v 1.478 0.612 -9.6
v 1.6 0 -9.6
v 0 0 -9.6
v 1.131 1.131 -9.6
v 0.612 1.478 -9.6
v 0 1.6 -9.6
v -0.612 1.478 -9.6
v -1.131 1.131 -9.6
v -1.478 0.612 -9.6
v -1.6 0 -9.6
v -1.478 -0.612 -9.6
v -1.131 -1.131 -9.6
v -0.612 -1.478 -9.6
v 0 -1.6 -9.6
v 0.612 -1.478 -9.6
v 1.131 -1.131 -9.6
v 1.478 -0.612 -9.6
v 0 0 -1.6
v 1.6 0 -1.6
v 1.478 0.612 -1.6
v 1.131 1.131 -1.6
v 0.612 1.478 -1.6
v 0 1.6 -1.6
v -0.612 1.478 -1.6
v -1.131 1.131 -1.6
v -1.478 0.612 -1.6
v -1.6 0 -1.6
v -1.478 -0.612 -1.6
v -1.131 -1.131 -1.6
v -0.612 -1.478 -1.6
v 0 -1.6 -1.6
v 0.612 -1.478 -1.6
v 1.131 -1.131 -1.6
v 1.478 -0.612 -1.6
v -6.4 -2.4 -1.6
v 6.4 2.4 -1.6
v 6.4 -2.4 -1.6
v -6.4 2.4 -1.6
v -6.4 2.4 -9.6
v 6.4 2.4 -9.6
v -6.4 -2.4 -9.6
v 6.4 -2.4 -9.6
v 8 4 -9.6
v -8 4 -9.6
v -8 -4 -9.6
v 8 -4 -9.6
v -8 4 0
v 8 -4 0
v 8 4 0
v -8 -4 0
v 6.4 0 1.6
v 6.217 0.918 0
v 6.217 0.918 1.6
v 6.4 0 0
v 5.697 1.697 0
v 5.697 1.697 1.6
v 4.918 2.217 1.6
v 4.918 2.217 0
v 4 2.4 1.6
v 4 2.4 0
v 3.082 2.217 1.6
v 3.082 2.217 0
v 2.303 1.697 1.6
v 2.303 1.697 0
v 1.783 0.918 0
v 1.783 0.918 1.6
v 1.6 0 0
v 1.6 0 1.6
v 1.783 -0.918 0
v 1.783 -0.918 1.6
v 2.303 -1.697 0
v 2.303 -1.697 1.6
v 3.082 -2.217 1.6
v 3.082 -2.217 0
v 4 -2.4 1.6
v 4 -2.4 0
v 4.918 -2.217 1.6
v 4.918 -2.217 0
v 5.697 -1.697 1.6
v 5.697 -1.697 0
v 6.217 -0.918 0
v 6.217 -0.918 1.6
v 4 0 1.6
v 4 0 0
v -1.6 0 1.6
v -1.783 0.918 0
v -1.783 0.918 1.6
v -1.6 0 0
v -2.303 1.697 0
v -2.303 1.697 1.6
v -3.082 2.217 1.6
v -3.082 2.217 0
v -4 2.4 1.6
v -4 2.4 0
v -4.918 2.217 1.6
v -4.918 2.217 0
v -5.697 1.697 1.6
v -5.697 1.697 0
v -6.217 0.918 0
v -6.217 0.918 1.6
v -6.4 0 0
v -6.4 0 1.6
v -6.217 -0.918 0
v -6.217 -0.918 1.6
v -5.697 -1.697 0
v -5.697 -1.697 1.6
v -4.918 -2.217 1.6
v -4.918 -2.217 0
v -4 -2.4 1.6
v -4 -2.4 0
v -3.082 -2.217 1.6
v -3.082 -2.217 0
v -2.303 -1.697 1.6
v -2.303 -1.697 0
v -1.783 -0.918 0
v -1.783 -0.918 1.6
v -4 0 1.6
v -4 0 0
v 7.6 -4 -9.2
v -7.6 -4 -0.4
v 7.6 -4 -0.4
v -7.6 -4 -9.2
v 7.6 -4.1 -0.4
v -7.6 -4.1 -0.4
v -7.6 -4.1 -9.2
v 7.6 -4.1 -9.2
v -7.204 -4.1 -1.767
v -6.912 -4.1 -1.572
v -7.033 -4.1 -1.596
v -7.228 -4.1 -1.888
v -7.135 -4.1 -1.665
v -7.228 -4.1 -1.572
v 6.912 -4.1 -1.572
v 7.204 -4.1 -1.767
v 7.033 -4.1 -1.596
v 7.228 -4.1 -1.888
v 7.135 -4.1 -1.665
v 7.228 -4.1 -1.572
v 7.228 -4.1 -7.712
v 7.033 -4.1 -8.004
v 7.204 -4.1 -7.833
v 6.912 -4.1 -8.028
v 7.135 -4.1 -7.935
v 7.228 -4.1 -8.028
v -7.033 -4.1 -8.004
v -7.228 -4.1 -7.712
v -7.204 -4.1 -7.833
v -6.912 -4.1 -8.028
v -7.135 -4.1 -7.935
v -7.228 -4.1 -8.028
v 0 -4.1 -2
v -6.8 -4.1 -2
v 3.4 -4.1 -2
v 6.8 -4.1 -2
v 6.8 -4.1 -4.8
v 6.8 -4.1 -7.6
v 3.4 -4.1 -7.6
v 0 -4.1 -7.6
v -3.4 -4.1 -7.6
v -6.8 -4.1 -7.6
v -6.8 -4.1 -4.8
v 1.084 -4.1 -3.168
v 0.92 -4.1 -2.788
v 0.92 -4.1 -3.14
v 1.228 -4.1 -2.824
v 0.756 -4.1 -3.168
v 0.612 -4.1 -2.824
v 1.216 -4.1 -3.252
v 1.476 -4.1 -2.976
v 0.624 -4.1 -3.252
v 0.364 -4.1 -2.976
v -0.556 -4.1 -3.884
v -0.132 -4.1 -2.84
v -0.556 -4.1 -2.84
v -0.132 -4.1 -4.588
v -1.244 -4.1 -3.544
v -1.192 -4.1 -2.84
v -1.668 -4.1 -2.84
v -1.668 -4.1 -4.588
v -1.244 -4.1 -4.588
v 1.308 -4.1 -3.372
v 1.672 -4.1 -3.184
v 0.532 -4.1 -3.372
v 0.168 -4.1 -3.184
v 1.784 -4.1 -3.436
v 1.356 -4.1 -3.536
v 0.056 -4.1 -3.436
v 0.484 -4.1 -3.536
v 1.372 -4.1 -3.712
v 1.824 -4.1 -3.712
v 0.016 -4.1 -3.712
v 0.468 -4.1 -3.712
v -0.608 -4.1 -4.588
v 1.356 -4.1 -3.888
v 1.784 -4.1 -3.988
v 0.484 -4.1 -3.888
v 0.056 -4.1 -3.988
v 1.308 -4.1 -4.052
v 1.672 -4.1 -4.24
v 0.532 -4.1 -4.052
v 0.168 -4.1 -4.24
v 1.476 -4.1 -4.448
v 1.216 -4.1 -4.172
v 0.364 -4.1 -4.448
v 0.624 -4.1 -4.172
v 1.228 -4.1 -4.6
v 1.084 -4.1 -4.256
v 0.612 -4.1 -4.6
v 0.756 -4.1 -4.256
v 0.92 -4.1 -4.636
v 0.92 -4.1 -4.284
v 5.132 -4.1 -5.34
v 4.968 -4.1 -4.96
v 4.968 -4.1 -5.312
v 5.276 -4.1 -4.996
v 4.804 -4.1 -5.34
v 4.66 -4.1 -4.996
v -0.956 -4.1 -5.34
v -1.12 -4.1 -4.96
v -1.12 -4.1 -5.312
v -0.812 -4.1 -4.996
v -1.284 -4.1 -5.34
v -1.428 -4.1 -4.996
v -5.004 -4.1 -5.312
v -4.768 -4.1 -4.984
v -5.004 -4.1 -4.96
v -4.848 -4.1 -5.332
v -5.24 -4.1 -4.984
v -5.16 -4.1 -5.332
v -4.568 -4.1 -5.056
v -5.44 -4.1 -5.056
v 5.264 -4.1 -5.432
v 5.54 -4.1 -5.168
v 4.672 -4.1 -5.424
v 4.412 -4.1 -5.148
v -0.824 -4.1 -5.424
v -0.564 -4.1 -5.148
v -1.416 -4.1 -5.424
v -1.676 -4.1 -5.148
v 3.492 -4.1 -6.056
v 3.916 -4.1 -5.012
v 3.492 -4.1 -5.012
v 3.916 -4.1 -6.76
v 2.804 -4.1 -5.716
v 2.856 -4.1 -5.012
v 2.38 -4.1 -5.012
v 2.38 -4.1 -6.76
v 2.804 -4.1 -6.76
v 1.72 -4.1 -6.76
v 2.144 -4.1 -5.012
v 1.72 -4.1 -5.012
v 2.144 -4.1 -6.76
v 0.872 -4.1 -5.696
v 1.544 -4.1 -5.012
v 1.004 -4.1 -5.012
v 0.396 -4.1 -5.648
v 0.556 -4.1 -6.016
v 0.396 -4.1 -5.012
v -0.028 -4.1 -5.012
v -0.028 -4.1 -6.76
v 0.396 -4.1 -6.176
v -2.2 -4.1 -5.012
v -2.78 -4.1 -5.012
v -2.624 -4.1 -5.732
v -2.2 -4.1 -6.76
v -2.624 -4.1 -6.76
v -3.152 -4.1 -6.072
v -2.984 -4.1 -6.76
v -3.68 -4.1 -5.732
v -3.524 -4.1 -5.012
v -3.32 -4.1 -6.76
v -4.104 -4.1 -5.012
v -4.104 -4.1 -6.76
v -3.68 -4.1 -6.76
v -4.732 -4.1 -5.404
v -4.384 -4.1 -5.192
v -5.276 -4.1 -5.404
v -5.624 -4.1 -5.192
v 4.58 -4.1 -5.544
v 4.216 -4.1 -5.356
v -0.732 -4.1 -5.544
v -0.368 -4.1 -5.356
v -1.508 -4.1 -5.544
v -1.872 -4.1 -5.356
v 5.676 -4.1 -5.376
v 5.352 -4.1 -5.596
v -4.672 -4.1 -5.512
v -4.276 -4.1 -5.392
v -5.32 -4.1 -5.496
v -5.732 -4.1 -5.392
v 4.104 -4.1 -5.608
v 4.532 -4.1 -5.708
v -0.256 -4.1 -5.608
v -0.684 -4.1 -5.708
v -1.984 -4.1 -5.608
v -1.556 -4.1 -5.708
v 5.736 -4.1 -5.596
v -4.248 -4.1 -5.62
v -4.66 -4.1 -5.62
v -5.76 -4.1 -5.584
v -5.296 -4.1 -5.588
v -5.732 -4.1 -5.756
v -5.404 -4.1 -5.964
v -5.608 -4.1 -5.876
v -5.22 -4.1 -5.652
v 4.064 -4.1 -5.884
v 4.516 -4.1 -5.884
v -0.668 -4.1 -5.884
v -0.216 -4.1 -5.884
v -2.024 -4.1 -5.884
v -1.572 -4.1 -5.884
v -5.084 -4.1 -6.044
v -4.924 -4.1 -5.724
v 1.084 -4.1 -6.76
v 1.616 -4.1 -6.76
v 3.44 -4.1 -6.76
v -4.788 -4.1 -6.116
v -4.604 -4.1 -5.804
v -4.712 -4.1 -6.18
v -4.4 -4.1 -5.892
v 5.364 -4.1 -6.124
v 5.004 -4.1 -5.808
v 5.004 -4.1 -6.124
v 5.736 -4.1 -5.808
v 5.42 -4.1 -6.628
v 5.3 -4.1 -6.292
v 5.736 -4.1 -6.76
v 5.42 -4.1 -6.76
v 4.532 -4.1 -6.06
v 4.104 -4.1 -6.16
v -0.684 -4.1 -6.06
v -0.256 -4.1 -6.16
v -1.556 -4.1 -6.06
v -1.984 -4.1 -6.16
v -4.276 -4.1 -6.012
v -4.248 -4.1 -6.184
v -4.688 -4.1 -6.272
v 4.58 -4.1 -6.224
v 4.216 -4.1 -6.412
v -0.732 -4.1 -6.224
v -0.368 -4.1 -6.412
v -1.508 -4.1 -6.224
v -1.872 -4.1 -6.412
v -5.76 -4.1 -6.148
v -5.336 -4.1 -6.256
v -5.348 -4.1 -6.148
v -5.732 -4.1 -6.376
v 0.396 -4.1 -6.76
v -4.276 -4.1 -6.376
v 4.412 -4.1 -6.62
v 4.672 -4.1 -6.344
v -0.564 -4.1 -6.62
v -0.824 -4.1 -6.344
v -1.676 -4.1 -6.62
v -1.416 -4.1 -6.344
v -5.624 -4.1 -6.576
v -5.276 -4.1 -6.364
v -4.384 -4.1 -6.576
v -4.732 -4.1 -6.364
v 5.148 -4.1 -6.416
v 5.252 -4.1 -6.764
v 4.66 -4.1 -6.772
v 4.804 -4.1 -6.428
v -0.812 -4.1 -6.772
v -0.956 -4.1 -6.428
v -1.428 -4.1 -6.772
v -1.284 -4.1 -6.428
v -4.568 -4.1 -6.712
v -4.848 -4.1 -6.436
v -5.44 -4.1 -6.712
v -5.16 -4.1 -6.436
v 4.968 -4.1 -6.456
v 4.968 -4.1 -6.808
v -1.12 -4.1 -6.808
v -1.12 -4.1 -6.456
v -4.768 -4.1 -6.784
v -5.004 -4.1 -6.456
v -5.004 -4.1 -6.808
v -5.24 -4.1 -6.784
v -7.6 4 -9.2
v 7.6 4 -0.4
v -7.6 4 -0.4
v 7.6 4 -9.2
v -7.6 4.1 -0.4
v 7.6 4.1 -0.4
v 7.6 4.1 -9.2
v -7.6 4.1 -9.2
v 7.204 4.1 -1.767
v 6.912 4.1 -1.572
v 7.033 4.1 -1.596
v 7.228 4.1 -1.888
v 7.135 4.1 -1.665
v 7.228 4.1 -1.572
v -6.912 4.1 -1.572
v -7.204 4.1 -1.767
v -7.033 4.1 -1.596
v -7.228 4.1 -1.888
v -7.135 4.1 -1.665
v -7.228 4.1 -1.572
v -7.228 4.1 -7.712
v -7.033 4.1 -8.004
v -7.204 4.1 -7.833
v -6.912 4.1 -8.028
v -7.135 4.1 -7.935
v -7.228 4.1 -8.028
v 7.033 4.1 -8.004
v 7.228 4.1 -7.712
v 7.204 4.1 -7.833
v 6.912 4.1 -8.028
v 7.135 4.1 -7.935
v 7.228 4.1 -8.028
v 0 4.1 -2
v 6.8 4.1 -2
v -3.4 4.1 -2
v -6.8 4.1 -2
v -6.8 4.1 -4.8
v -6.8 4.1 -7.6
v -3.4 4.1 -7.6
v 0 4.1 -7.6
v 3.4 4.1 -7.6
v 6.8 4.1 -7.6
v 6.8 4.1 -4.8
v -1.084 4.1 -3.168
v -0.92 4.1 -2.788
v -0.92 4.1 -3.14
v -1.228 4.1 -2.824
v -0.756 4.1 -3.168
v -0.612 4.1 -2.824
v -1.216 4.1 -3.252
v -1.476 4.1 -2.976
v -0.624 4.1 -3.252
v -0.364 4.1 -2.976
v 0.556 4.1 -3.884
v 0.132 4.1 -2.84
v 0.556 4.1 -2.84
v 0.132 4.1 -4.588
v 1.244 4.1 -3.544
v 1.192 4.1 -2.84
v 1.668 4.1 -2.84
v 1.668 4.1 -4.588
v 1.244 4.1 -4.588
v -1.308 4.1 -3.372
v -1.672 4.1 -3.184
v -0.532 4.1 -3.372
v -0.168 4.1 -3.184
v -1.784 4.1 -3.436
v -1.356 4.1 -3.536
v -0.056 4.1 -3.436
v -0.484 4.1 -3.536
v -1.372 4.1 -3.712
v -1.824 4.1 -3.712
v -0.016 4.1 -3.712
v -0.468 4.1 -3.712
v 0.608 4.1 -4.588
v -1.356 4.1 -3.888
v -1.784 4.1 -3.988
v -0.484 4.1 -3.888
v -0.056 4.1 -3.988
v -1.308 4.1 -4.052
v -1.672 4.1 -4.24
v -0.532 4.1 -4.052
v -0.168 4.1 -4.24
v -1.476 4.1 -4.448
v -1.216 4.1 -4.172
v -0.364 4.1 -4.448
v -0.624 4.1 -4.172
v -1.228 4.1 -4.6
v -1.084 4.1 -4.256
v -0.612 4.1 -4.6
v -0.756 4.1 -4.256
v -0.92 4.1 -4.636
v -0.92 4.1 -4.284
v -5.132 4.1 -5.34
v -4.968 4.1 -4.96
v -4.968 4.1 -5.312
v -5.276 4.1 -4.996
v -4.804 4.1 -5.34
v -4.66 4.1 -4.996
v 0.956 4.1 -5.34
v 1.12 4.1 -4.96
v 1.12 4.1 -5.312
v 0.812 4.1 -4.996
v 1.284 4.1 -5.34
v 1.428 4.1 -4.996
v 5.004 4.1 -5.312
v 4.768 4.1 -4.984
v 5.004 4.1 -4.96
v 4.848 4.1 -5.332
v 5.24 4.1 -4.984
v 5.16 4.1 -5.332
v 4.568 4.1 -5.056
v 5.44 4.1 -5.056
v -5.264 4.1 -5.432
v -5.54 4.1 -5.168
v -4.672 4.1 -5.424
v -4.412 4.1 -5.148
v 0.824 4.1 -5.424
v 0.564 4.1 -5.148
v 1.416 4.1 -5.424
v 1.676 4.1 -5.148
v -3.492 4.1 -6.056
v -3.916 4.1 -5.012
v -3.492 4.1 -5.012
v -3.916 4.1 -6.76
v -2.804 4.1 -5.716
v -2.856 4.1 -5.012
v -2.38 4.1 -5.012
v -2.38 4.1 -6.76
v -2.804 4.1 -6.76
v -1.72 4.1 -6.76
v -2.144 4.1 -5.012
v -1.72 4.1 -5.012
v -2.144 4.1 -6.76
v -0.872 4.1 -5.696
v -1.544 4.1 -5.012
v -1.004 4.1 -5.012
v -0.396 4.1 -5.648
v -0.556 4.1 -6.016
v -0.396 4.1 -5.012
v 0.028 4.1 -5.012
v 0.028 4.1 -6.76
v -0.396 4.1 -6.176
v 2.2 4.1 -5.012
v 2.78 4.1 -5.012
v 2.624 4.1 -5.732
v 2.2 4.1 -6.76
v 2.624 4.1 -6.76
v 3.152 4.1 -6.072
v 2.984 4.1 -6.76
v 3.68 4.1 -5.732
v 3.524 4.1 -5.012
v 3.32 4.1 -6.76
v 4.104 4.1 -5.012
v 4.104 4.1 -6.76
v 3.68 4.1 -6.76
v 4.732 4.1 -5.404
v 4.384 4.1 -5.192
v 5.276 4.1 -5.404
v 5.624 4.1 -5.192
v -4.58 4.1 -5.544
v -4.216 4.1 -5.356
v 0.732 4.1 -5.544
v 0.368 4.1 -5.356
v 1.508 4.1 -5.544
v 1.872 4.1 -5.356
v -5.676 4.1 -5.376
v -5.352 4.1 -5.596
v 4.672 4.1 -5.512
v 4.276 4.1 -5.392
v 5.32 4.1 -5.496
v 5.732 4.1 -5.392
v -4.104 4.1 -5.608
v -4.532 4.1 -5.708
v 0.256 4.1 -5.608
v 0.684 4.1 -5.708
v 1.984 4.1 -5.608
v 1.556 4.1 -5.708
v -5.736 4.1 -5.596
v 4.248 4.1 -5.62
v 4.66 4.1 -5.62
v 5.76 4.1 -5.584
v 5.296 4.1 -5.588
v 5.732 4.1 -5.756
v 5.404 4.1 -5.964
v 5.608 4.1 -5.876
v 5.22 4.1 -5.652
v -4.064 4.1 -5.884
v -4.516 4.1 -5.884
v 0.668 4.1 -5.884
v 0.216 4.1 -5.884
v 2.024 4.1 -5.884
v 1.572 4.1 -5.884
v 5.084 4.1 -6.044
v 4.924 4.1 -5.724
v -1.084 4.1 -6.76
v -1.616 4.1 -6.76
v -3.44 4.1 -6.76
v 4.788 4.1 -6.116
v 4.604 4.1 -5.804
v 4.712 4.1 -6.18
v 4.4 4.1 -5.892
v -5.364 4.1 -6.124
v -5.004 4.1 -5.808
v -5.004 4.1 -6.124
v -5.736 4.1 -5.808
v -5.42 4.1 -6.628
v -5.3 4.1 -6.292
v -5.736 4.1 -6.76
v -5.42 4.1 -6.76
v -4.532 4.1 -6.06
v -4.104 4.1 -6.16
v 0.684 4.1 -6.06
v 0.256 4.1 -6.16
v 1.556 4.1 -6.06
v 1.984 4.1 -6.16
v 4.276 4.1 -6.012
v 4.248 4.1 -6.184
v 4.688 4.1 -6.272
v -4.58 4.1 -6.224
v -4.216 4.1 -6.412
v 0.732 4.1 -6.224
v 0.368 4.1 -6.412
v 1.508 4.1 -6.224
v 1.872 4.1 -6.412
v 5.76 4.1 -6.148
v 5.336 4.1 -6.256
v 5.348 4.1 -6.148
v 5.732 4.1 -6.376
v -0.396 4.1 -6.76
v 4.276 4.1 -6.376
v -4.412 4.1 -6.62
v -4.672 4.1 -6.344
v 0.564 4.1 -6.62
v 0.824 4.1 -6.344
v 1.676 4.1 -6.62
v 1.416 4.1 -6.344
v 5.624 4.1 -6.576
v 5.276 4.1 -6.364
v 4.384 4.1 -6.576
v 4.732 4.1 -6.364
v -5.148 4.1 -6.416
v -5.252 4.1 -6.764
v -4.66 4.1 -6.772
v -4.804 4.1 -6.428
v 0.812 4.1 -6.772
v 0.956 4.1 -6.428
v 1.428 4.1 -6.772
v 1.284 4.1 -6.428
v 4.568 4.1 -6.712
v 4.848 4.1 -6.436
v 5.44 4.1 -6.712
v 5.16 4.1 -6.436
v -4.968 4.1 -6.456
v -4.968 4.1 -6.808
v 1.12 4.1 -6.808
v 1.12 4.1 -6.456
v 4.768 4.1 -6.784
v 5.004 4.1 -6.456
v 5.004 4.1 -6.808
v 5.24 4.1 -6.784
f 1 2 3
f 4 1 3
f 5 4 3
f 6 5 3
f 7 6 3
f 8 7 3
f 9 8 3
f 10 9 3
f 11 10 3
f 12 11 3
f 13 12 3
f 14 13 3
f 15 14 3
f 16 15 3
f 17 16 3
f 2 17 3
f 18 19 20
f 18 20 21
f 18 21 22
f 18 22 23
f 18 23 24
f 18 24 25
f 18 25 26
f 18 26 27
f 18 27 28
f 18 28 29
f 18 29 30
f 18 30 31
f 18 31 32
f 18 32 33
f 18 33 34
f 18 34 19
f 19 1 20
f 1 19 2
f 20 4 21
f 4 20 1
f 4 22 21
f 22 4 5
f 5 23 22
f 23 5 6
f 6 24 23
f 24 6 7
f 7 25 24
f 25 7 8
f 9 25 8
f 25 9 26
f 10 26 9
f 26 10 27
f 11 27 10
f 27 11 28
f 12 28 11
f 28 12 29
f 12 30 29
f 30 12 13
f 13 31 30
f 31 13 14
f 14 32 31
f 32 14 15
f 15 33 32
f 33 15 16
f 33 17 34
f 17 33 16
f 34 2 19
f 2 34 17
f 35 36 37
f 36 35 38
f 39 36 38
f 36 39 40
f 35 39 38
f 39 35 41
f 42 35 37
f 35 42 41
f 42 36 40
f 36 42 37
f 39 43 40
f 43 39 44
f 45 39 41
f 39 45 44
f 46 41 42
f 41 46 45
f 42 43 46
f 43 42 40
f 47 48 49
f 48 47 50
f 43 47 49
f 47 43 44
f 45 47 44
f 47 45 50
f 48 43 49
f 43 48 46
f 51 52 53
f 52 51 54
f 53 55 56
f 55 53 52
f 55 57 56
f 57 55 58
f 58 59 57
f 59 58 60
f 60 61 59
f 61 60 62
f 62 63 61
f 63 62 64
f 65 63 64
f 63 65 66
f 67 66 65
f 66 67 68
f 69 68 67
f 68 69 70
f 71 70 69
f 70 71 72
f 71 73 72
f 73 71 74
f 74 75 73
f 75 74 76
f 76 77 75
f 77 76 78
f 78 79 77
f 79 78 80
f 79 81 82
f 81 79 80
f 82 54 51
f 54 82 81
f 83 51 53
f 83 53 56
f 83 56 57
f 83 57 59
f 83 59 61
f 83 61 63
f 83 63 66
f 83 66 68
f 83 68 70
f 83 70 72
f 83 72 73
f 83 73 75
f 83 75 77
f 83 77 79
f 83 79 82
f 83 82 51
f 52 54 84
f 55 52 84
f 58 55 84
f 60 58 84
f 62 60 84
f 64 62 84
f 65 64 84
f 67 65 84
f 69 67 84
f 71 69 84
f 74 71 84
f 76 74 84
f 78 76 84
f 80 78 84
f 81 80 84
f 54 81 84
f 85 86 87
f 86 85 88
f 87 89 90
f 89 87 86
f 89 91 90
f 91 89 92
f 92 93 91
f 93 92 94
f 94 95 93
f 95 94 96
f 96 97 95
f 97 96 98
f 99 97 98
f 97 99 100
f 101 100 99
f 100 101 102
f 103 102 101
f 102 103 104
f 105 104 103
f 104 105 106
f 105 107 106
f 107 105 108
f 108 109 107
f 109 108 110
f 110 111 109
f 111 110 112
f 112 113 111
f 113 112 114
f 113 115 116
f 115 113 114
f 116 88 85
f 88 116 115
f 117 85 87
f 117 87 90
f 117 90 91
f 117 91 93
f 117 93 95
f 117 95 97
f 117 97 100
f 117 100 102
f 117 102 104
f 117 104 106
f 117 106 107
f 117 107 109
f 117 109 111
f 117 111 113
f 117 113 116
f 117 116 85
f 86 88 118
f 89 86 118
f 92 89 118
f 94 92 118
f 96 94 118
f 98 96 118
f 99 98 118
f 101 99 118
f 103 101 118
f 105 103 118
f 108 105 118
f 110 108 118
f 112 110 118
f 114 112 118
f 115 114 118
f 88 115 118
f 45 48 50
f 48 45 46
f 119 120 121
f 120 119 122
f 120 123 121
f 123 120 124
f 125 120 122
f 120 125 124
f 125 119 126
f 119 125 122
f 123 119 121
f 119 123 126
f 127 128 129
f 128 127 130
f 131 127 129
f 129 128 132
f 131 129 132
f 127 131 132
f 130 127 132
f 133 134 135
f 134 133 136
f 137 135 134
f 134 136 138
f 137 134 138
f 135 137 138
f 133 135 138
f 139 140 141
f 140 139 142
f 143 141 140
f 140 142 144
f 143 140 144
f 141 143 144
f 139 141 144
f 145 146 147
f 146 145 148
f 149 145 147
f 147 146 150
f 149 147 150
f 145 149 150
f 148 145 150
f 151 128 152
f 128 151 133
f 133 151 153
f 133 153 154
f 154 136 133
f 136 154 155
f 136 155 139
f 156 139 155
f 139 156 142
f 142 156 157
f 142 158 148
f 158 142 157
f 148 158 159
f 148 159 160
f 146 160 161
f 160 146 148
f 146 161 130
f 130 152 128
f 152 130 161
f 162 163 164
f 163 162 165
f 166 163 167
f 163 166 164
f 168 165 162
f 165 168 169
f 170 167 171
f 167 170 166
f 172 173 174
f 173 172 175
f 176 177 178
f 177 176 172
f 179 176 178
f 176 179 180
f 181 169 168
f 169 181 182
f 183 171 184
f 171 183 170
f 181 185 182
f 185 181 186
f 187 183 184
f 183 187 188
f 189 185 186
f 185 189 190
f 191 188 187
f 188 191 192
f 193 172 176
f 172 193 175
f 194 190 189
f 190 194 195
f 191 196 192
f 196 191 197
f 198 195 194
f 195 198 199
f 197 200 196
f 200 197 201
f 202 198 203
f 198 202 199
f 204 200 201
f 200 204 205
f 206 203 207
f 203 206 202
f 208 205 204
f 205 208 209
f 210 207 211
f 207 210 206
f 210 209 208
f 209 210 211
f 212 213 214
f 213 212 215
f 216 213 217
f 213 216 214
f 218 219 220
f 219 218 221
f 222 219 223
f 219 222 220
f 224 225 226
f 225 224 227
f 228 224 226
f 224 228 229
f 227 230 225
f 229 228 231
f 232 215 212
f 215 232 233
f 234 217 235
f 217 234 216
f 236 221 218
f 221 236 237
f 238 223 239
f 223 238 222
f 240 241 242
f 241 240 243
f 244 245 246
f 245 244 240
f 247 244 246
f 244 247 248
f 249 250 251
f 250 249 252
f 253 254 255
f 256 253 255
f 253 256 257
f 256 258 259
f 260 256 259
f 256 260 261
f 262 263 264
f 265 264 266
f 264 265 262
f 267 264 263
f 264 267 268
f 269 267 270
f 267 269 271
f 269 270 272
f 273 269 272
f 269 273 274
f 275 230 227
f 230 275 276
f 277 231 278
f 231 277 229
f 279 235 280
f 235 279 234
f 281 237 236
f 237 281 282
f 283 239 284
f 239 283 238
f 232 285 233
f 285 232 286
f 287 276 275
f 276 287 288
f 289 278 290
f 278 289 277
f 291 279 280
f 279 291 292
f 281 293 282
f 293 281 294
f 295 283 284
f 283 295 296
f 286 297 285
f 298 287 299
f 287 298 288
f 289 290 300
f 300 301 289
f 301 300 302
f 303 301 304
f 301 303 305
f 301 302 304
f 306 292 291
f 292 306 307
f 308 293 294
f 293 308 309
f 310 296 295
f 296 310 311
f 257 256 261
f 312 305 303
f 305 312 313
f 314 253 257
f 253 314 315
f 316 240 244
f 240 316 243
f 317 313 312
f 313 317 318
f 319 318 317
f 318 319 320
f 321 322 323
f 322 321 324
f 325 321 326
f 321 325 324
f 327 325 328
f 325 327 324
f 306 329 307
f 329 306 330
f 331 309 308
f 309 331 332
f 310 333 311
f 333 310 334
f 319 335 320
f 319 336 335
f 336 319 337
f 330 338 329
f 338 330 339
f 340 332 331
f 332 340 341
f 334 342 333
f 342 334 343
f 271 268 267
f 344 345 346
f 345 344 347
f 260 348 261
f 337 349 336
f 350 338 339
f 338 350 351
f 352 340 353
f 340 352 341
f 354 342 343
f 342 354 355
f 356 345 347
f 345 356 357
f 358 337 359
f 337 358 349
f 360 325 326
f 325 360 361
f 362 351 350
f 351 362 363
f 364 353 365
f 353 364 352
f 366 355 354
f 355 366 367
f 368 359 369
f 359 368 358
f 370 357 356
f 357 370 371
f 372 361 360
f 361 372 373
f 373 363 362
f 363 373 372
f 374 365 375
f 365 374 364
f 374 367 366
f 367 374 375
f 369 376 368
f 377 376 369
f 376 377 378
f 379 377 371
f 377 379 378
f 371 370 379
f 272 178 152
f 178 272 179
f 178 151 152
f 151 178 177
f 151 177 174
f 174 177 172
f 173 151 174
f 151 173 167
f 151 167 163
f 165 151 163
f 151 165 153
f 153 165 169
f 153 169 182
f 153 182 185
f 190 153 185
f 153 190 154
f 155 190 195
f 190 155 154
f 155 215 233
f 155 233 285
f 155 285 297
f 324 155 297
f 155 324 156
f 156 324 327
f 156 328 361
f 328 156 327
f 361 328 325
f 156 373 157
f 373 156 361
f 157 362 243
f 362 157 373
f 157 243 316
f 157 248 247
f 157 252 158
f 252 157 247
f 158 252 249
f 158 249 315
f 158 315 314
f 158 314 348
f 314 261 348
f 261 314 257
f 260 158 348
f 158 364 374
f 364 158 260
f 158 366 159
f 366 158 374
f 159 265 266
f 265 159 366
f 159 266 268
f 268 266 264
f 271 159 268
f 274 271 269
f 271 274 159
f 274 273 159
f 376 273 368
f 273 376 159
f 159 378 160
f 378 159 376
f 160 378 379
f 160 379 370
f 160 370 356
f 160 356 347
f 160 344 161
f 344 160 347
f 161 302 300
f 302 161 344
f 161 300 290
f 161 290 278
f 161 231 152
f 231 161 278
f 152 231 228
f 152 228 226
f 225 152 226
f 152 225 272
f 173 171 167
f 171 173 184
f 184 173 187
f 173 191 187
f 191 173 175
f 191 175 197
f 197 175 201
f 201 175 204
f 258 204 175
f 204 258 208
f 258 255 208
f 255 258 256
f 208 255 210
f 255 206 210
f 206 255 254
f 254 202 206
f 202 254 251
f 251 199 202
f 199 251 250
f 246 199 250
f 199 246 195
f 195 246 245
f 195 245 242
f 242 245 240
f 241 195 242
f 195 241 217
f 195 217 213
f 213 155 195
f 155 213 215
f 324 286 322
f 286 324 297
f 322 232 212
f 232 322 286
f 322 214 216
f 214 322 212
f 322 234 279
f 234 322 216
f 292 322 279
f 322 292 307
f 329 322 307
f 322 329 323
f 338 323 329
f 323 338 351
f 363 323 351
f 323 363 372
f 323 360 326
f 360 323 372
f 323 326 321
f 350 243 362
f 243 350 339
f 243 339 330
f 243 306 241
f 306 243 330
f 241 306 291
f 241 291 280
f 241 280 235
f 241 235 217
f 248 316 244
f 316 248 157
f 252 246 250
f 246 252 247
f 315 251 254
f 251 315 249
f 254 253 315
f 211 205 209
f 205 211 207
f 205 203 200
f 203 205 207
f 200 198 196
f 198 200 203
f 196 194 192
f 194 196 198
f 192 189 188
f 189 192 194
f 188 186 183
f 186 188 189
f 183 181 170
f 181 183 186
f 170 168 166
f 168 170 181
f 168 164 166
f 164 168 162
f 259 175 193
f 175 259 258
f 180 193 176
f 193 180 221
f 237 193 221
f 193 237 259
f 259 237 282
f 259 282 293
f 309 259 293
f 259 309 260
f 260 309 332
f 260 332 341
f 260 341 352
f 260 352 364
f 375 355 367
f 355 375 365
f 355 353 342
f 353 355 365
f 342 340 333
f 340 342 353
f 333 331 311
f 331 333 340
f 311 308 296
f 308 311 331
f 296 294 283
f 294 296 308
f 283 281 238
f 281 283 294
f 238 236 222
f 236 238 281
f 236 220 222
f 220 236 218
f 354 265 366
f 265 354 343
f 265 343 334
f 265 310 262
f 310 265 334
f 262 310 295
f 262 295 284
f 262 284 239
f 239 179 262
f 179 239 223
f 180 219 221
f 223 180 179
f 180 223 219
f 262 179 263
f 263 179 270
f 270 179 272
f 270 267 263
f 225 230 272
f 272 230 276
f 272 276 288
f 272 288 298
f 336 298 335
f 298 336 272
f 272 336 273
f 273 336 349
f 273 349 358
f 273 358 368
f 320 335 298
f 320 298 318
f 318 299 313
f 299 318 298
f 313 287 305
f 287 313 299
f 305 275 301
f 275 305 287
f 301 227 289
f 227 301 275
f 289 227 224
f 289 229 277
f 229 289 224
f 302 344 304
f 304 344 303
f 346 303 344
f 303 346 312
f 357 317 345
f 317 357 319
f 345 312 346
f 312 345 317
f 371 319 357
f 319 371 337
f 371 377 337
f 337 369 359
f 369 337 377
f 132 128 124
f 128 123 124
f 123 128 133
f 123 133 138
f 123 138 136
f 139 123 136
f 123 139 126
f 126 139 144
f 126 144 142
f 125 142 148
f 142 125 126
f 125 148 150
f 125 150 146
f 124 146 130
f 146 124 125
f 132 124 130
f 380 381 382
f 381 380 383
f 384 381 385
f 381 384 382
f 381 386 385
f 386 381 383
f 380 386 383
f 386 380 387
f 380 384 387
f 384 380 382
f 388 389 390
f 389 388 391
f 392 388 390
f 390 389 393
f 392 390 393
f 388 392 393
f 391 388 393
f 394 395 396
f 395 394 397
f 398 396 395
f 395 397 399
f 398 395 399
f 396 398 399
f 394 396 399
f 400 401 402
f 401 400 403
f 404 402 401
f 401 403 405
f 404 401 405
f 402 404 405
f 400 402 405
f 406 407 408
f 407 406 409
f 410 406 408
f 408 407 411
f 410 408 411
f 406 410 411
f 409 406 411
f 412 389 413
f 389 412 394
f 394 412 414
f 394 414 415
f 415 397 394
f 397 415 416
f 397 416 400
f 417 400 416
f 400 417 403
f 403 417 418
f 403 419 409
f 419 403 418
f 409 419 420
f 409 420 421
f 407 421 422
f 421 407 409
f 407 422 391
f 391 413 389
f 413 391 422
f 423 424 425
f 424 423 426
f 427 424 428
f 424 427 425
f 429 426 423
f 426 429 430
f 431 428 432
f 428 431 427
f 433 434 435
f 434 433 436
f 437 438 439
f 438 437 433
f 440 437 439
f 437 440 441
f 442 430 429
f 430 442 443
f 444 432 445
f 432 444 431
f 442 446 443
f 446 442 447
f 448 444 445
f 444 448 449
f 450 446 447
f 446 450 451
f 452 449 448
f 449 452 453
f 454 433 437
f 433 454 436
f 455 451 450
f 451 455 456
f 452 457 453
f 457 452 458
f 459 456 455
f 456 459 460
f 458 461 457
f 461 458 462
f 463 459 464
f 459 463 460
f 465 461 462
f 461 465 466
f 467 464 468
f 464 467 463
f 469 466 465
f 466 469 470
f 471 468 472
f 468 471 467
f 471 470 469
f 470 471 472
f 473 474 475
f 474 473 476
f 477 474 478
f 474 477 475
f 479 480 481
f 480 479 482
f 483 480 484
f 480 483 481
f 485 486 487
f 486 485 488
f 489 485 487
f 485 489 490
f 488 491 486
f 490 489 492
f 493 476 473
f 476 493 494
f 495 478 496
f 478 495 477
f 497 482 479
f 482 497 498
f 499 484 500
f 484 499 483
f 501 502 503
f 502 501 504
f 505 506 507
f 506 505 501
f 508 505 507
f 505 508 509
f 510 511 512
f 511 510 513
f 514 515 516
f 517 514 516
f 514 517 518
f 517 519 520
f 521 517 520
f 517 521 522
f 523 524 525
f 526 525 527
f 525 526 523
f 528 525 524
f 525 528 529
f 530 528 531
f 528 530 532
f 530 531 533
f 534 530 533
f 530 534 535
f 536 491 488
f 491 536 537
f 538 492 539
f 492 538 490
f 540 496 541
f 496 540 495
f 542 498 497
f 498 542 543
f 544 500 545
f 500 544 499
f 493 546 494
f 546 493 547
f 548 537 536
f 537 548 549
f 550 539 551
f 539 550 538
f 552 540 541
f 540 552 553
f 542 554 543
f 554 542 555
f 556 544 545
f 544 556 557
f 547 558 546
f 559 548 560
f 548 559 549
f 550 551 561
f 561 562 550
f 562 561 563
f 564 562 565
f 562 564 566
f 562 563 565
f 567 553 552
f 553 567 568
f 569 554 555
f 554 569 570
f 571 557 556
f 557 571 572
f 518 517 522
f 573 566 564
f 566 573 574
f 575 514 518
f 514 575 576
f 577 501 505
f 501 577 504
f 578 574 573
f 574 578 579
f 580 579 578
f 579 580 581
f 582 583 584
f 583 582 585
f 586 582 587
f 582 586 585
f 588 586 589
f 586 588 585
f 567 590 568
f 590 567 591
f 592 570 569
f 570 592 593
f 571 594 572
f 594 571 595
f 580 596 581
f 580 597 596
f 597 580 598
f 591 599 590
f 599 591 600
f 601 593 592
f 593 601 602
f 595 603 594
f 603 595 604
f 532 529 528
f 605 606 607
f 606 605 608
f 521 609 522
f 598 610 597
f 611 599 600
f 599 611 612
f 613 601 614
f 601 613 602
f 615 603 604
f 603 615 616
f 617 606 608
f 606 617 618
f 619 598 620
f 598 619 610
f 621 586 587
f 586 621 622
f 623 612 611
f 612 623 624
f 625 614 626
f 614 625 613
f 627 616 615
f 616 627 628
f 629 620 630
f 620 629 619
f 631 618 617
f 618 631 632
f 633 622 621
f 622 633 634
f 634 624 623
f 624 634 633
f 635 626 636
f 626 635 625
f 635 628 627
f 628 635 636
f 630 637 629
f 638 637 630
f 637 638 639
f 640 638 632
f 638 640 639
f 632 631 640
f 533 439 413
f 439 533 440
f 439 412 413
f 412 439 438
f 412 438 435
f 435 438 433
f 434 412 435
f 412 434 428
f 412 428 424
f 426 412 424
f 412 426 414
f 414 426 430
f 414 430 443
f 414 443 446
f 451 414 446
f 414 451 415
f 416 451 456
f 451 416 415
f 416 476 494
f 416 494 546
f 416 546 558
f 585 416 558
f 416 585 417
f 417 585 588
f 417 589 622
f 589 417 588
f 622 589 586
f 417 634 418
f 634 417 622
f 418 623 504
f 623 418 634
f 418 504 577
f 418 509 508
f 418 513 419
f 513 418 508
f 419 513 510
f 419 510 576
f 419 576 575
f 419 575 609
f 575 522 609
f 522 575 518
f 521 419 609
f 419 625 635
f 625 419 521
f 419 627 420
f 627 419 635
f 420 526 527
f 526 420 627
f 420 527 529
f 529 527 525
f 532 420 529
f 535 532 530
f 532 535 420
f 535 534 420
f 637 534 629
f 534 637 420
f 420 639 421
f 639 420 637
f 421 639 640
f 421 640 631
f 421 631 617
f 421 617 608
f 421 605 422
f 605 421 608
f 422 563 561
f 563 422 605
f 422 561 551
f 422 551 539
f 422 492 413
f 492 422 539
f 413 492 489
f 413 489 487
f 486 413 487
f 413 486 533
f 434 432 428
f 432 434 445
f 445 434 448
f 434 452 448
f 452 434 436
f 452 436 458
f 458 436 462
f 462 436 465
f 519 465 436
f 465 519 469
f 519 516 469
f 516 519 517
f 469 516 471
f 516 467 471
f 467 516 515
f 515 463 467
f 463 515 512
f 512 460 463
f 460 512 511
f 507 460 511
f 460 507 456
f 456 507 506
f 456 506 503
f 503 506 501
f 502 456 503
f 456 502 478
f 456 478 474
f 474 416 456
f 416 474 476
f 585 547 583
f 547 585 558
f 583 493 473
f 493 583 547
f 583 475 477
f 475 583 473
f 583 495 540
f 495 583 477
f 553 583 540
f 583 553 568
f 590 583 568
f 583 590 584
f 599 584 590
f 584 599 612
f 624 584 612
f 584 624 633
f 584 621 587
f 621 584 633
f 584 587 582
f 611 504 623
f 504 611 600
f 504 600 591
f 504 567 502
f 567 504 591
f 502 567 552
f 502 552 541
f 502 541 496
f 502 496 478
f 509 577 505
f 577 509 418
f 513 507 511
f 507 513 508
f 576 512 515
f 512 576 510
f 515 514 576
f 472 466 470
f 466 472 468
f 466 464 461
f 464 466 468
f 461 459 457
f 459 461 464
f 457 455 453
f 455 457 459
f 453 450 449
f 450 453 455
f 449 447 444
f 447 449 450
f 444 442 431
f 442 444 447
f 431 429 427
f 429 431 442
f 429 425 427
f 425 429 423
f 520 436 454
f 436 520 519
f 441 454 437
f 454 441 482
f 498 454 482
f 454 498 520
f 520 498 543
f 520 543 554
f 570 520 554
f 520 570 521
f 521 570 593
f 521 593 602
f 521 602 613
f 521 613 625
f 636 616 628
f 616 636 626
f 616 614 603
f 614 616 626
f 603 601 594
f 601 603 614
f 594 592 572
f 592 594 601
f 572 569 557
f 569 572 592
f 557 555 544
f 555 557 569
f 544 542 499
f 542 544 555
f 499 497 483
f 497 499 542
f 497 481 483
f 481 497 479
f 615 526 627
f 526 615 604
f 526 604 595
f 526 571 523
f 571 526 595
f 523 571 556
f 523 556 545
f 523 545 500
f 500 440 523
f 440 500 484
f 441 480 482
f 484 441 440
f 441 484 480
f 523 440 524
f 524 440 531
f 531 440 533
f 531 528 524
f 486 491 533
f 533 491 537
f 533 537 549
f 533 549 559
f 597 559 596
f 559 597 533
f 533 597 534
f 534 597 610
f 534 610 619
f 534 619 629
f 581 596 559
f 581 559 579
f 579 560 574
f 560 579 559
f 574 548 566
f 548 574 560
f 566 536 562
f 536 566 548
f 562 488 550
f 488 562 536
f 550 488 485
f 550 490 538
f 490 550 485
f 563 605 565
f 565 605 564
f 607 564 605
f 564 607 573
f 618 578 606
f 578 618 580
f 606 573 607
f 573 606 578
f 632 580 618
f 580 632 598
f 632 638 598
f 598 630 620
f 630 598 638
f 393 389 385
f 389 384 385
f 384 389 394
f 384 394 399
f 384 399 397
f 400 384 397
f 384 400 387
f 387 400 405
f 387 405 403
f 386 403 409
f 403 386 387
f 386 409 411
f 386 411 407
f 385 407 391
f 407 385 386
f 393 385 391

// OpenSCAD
use <../lib.scad>
use <192375h.scad>
use <3004.scad>
function ldraw_lib__3004d0g() = [
// 0 Brick  1 x  2 with "NO SMOKING" Sticker on Both Sides
// 0 Name: 3004d0g.dat
// 0 Author: Takeshi Takahashi [RainbowDolphin]
// 0 !LDRAW_ORG Shortcut UPDATE 2024-08
// 0 !LICENSE Licensed under CC BY 4.0 : see CAreadme.txt
// 
// 0 BFC CERTIFY CCW
  [0,"BFC","CERTIFY"],
  [0,"BFC","CCW"],
// 
// 0 !CATEGORY Sticker Shortcut
// 0 !KEYWORDS Bricklink 3004pb061, Gas Station, Set 6375-2
// 
// 0 !HISTORY 2024-09-30 [OrionP] Official Update 2024-08
// 
// 1 16 0 0 0 1 0 0 0 1 0 0 0 1 3004.dat
  [1,16,0,0,0,1,0,0,0,1,0,0,0,1, ldraw_lib__3004()],
// 1 16 0 12 -10 1 0 0 0 0 -1 0 1 0 192375h.dat
  [1,16,0,12,-10,1,0,0,0,0,-1,0,1,0, ldraw_lib__192375h()],
// 1 16 0 12 10 -1 0 0 0 0 -1 0 -1 0 192375h.dat
  [1,16,0,12,10,-1,0,0,0,0,-1,0,-1,0, ldraw_lib__192375h()],
];
module ldraw_lib__3004d0g(step=0, col=false, unit=2/5, alt=false, line=0.2, solid=!$preview)
    makepoly(ldraw_lib__3004d0g(), step=step, col=col, unit=unit, alt=alt, line=line, solid=solid);
ldraw_lib__3004d0g(line=0.2);
